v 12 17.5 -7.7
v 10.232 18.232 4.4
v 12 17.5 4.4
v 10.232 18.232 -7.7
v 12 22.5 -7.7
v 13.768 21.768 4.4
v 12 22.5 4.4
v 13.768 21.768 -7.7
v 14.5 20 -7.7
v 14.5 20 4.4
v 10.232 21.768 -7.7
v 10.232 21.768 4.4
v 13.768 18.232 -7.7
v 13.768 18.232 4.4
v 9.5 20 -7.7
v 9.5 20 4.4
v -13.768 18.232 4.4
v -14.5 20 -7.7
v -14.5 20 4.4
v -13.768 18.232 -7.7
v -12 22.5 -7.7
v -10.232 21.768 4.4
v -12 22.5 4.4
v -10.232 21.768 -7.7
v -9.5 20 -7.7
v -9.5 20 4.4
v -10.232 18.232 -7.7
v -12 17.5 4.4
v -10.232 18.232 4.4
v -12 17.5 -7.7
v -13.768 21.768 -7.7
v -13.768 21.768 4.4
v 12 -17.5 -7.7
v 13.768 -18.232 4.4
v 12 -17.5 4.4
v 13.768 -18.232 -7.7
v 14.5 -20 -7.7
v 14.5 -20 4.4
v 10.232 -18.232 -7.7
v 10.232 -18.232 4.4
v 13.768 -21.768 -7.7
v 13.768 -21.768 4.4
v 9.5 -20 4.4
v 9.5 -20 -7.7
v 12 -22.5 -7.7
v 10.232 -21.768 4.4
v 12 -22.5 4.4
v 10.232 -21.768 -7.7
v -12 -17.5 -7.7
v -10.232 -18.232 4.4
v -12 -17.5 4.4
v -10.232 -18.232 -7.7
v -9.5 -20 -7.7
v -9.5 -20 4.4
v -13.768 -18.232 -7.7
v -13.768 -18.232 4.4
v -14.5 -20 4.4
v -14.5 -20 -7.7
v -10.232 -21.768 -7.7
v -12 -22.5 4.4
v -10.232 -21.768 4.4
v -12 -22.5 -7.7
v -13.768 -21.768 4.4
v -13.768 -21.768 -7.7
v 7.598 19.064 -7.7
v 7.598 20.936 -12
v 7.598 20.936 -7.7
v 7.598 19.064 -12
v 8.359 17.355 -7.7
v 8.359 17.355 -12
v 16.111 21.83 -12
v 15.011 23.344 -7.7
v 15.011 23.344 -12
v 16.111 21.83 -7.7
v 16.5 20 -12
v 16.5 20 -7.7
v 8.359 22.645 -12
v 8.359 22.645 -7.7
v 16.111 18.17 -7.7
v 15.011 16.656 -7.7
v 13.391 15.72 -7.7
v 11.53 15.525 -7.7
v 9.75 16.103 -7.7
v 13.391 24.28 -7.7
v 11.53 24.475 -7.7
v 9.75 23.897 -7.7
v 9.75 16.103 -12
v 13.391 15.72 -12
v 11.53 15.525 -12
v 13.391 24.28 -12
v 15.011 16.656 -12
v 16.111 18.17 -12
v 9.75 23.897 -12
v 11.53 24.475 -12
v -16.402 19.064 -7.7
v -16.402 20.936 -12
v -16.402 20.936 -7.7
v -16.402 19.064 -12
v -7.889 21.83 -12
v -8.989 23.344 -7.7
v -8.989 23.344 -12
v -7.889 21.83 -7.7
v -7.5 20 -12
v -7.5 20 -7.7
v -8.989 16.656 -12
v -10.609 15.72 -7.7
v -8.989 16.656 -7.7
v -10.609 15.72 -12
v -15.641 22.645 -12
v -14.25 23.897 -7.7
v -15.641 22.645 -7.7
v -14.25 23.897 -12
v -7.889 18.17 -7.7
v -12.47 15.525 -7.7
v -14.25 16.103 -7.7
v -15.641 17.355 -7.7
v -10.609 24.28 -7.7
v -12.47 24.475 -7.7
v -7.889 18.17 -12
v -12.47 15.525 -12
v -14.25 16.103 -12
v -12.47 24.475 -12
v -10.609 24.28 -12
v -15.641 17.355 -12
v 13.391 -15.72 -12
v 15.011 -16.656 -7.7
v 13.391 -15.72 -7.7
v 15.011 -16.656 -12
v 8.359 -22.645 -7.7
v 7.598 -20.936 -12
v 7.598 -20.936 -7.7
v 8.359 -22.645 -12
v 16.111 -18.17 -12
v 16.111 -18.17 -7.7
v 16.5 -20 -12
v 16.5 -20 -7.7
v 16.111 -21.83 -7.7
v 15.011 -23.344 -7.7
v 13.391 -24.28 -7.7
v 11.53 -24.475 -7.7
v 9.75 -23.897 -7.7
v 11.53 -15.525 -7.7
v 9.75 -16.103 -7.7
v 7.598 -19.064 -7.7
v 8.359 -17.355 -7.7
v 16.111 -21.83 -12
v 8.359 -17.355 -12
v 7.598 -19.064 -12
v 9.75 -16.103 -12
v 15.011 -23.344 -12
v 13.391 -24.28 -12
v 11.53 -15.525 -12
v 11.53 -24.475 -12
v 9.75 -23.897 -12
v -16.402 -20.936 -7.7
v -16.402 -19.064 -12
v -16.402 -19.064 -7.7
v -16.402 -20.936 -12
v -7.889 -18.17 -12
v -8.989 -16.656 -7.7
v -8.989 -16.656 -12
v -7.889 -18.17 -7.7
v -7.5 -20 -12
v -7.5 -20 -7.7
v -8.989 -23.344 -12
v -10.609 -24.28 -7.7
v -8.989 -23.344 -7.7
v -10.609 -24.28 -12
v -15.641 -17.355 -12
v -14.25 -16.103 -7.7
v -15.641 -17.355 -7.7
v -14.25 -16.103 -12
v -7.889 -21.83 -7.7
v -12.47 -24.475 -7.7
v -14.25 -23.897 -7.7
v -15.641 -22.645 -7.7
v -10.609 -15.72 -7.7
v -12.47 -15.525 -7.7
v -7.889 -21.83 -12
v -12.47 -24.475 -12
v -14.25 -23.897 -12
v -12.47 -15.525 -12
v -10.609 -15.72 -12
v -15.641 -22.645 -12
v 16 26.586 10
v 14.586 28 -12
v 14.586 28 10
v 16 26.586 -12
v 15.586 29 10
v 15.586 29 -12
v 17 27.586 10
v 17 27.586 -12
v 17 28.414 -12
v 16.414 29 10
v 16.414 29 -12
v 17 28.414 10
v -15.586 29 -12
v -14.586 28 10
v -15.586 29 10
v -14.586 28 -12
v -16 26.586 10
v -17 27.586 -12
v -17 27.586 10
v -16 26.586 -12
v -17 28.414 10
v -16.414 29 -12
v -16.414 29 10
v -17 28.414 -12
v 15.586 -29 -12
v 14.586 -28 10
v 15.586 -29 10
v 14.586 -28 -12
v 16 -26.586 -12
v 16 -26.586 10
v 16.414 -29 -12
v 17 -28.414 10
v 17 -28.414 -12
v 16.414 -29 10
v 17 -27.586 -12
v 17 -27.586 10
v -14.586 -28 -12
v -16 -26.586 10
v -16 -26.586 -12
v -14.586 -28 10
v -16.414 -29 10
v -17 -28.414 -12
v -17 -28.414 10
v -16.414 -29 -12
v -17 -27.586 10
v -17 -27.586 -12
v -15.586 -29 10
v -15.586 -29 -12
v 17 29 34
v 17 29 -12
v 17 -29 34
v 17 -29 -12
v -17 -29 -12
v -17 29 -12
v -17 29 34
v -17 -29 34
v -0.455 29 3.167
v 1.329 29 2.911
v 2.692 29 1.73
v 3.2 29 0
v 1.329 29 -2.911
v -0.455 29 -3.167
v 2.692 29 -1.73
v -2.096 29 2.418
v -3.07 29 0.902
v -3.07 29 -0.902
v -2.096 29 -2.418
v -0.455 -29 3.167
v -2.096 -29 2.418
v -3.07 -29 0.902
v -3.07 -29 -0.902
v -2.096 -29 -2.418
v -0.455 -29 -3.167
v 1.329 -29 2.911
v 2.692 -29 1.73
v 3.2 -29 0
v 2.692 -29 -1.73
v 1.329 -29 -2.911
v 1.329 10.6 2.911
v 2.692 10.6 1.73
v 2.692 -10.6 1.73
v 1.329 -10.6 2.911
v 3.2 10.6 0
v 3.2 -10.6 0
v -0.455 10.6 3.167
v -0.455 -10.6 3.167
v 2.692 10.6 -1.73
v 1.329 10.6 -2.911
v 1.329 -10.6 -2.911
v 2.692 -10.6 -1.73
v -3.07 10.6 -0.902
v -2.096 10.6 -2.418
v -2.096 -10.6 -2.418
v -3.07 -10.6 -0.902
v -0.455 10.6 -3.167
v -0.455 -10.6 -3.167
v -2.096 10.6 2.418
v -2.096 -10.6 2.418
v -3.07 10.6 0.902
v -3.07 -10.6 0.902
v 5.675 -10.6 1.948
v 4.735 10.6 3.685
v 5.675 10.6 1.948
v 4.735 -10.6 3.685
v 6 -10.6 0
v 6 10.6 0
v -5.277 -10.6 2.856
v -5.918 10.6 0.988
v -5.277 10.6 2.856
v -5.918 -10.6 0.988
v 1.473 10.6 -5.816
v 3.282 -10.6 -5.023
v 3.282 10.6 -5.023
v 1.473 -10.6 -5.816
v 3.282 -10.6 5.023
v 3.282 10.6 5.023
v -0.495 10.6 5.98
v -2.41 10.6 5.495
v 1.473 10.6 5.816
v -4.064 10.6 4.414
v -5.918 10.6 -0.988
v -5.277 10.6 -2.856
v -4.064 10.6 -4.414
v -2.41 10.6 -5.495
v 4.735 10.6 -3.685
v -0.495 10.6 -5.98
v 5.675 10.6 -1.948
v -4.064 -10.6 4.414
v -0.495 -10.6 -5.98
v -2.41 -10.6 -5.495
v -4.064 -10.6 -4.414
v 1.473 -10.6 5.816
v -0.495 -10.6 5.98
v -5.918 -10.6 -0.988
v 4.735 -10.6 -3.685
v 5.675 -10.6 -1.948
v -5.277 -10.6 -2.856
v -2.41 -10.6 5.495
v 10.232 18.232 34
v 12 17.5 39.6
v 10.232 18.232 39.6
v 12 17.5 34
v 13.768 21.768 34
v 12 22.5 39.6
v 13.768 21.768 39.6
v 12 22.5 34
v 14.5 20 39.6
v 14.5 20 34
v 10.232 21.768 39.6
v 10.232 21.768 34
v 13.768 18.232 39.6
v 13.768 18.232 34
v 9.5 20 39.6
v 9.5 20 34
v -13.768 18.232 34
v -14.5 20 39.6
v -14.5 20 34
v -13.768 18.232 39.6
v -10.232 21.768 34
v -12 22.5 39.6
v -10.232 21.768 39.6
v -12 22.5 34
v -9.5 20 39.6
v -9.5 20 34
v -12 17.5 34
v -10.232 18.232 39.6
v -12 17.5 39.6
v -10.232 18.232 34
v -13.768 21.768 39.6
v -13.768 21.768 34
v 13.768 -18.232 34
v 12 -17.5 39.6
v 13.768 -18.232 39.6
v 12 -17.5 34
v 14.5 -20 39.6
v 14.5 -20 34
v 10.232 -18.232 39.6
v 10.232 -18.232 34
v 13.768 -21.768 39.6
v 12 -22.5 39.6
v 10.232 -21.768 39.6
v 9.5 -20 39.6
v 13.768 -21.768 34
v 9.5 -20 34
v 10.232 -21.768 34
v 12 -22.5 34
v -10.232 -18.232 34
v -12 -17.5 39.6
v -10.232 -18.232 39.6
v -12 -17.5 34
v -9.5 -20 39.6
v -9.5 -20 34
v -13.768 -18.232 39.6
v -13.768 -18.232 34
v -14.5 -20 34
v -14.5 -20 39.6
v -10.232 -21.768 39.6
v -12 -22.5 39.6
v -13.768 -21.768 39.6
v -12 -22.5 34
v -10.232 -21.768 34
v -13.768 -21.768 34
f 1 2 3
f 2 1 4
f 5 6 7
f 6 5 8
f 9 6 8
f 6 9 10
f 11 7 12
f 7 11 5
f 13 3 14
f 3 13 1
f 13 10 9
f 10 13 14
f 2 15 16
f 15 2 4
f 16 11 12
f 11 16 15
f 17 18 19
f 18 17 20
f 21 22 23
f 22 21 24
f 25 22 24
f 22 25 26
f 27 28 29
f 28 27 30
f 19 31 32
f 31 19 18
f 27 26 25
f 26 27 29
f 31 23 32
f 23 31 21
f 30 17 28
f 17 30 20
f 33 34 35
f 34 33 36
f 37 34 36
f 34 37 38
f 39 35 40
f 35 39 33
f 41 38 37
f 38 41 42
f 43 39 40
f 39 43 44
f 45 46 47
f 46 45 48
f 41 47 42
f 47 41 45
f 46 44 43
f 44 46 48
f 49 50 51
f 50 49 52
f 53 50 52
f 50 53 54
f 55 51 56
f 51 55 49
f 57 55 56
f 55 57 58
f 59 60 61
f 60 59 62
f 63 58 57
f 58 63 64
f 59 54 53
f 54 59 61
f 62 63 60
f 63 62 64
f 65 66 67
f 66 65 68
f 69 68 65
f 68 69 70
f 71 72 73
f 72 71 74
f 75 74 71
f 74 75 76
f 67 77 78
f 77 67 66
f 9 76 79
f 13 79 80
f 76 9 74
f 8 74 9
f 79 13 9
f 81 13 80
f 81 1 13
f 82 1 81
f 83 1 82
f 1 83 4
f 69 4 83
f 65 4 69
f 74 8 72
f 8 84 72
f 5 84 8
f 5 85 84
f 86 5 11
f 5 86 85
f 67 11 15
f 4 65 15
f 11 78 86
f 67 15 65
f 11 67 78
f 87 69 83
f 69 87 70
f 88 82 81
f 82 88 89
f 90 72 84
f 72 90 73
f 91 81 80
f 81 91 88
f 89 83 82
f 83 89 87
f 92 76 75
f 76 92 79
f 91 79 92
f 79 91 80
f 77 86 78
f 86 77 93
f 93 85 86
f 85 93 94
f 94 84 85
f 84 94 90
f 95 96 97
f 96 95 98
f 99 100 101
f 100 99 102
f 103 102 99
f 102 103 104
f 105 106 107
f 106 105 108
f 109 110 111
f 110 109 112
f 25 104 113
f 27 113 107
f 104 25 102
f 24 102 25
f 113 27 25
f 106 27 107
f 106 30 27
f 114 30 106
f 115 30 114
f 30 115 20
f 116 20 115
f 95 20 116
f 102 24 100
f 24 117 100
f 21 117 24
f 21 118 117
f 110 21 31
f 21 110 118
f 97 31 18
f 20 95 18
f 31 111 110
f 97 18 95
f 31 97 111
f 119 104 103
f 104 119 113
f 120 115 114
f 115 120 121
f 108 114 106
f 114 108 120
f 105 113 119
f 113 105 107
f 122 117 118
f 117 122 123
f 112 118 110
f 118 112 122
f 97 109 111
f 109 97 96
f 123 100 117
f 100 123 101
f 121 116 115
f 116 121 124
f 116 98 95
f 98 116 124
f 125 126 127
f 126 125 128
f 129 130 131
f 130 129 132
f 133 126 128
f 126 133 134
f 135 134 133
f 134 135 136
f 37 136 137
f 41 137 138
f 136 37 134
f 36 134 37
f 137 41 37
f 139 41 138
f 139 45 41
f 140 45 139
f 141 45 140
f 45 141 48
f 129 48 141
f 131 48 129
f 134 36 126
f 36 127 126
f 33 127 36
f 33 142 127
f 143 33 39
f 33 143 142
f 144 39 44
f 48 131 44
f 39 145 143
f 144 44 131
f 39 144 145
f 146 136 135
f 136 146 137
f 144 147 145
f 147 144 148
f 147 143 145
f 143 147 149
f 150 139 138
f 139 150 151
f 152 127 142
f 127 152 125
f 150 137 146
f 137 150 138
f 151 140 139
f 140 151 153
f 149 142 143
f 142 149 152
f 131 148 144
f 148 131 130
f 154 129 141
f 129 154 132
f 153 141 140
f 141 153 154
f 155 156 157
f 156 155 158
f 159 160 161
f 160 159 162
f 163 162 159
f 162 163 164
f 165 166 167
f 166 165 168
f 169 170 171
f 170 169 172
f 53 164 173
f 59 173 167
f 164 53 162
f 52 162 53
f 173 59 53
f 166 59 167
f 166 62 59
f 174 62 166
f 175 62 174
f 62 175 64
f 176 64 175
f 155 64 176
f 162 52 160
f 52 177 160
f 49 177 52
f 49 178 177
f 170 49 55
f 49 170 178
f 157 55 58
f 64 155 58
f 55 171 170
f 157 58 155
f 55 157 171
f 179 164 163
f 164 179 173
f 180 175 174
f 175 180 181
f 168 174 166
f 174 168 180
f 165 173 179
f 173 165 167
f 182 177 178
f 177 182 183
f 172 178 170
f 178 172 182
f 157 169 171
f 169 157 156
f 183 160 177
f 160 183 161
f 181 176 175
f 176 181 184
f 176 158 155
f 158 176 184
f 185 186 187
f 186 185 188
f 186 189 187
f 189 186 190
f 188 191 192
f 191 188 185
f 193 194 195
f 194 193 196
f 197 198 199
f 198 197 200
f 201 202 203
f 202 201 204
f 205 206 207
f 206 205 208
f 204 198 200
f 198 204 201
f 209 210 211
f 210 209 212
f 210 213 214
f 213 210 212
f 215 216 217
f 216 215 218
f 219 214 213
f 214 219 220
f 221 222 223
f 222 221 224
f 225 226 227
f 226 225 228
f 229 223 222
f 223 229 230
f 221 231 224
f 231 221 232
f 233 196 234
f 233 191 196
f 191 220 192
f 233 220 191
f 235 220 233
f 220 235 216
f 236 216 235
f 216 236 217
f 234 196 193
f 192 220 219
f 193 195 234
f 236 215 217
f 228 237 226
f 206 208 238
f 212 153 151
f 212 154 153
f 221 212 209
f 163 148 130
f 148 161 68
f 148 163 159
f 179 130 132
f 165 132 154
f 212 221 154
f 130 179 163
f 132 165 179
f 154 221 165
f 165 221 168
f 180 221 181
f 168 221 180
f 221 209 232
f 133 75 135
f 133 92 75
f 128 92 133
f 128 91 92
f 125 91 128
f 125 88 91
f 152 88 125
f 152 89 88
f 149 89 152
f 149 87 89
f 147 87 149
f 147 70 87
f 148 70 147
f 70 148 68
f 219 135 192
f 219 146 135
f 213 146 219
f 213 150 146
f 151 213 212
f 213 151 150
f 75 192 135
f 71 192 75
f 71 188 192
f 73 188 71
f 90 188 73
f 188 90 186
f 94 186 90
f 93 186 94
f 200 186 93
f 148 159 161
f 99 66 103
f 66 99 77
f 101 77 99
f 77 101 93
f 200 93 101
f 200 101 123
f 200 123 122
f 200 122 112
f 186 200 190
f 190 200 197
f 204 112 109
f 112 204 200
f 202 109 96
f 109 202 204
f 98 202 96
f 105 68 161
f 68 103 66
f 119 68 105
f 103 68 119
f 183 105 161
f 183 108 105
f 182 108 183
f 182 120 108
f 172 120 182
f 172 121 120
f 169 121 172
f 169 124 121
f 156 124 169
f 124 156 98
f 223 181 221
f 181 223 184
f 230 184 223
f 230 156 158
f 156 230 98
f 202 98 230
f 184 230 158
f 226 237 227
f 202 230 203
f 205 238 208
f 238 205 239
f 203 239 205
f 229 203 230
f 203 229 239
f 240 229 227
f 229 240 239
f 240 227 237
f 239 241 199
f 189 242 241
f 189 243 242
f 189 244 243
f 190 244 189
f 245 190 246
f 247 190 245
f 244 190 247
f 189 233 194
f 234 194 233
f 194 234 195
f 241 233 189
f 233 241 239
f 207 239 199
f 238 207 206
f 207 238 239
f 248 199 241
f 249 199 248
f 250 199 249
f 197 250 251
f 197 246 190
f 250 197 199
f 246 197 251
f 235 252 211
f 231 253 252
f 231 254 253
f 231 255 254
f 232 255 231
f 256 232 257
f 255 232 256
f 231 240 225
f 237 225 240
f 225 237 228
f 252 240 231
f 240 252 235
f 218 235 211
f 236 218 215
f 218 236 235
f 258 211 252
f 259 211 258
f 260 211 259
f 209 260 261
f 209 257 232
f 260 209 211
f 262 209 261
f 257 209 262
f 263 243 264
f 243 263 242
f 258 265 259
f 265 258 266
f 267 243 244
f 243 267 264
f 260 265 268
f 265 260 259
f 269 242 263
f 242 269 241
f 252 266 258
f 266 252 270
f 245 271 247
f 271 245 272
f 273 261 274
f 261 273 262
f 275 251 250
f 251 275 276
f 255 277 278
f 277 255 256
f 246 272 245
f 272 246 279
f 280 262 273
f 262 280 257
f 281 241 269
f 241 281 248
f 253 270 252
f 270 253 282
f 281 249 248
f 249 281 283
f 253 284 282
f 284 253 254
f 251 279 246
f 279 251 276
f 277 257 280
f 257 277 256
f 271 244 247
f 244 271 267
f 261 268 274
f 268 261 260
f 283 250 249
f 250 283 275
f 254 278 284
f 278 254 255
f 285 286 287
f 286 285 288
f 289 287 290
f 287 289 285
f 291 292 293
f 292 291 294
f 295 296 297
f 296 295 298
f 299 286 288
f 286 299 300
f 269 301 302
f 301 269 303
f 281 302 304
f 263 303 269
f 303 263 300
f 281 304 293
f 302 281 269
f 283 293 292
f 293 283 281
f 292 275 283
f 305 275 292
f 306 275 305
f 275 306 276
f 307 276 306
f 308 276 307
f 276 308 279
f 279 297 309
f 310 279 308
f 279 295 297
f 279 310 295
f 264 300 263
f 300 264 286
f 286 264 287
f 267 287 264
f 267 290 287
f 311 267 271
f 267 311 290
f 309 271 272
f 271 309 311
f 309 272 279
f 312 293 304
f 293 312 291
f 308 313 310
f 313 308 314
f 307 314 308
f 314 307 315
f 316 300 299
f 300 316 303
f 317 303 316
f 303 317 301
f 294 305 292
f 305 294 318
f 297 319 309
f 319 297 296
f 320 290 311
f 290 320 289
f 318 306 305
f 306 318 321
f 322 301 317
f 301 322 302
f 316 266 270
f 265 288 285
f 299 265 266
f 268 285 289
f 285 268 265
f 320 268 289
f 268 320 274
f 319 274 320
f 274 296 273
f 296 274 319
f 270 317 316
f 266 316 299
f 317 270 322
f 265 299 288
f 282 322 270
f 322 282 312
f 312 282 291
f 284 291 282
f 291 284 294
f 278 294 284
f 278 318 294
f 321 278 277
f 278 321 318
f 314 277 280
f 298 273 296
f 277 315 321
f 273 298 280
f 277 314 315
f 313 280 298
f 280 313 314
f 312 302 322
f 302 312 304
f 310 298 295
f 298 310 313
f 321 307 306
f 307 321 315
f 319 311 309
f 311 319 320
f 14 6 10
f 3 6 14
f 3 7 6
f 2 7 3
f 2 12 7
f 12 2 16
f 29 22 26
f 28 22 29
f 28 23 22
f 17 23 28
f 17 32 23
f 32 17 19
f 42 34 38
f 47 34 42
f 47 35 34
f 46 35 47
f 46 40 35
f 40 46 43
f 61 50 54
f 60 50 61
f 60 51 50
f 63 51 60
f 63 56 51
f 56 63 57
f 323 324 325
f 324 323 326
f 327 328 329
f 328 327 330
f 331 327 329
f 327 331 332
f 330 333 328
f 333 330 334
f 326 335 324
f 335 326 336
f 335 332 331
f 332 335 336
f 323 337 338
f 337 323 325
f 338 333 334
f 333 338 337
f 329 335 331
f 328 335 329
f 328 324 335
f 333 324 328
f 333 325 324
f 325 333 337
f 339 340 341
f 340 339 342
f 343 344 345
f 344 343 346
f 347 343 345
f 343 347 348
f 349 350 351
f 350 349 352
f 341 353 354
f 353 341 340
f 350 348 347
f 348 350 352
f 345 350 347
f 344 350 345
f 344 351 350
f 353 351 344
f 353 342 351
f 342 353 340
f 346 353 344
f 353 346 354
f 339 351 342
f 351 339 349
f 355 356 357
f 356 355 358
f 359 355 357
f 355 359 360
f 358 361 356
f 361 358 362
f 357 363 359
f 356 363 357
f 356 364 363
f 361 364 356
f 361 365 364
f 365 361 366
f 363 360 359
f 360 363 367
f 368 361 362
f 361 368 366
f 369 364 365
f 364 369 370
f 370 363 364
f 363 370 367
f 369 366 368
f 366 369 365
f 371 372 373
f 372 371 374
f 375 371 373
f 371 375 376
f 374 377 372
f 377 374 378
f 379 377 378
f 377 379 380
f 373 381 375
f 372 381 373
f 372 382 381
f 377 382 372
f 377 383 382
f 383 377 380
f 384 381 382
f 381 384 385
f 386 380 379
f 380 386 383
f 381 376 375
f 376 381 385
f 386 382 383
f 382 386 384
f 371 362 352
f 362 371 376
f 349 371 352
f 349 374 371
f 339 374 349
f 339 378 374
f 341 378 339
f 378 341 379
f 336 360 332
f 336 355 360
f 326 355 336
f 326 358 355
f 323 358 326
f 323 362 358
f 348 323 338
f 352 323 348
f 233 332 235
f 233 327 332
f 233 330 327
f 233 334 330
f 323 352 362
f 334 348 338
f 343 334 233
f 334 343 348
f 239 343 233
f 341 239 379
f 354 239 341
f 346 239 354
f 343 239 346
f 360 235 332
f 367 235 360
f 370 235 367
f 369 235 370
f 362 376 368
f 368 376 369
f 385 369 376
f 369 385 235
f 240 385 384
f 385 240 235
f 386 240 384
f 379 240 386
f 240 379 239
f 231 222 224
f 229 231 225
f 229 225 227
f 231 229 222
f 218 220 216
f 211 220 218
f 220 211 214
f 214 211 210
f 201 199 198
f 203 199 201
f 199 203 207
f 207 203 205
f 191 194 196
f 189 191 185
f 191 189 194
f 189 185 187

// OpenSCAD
// Parameters
shaft_diameter = 6.0; //[3.0:12.0:0.1]
block_width = 34.0; //[17.0:68.0:0.5]
block_length = 58.0; //[29.0:116.0:0.5]
block_height = 24.0; //[12.0:48.0:0.5]
bearing_outer_diameter = 12.0; //[8.0:24.0:0.1]
bearing_length = 20.0; //[10.0:40.0:0.5]
bore_diameter = 6.4; //[6.1:8.0:0.05]
mount_hole_diameter = 5.0; //[3.0:8.0:0.1]
mount_hole_pattern_x = 24.0; //[12.0:48.0:0.5]
mount_hole_pattern_y = 40.0; //[20.0:80.0:0.5]
counterbore_diameter = 9.0; //[7.0:16.0:0.1]
counterbore_depth = 4.0; //[2.0:10.0:0.1]
chamfer_size = 1.0; //[0.5:3.0:0.1]
bore_lead_in_chamfer = 1.0; //[0.5:3.0:0.1]
eps = 0.6; //[0.2:2.0:0.1]

// SCS Bearing Block Assembly
module scs_bearing_block_assembly() {
  color("Silver") {
    difference() {
      // Block Body
      cube([block_width, block_length, block_height], center=true);
      
      // Shaft Bore
      rotate([90, 0, 0])
        translate([0, 0, 0])
        cylinder(h=block_length + 2*eps, r=bore_diameter/2, center=true);
      
      // Bearing Seat
      rotate([90, 0, 0])
        translate([0, 0, 0])
        cylinder(h=bearing_length + 2*eps, r=bearing_outer_diameter/2, center=true);
      
      // Mounting Holes
      union() {
        translate([mount_hole_pattern_x/2, mount_hole_pattern_y/2, 0])
          cylinder(h=block_height + 2*eps, r=mount_hole_diameter/2, center=true);
        translate([-mount_hole_pattern_x/2, mount_hole_pattern_y/2, 0])
          cylinder(h=block_height + 2*eps, r=mount_hole_diameter/2, center=true);
        translate([mount_hole_pattern_x/2, -mount_hole_pattern_y/2, 0])
          cylinder(h=block_height + 2*eps, r=mount_hole_diameter/2, center=true);
        translate([-mount_hole_pattern_x/2, -mount_hole_pattern_y/2, 0])
          cylinder(h=block_height + 2*eps, r=mount_hole_diameter/2, center=true);
      }
      
      // Counterbores
      union() {
        translate([mount_hole_pattern_x/2, mount_hole_pattern_y/2, -block_height/2 + counterbore_depth/2])
          cylinder(h=counterbore_depth + eps, r=counterbore_diameter/2, center=true);
        translate([-mount_hole_pattern_x/2, mount_hole_pattern_y/2, -block_height/2 + counterbore_depth/2])
          cylinder(h=counterbore_depth + eps, r=counterbore_diameter/2, center=true);
        translate([mount_hole_pattern_x/2, -mount_hole_pattern_y/2, -block_height/2 + counterbore_depth/2])
          cylinder(h=counterbore_depth + eps, r=counterbore_diameter/2, center=true);
        translate([-mount_hole_pattern_x/2, -mount_hole_pattern_y/2, -block_height/2 + counterbore_depth/2])
          cylinder(h=counterbore_depth + eps, r=counterbore_diameter/2, center=true);
      }
      
      // Bore Lead-in Chamfers
      union() {
        rotate([90, 0, 0])
          translate([0, block_length/2 - bore_lead_in_chamfer/2 + eps/2, 0])
          cylinder(h=bore_lead_in_chamfer, r1=bearing_outer_diameter/2 + bore_lead_in_chamfer, r2=bore_diameter/2, center=true);
        rotate([-90, 0, 0])
          translate([0, -block_length/2 + bore_lead_in_chamfer/2 - eps/2, 0])
          cylinder(h=bore_lead_in_chamfer, r1=bearing_outer_diameter/2 + bore_lead_in_chamfer, r2=bore_diameter/2, center=true);
      }
      
      // Chamfers
      union() {
        translate([block_width/2 - chamfer_size, block_length/2 - chamfer_size, 0])
          rotate([0, 0, 45])
          cube([chamfer_size*2, chamfer_size*2, block_height + 2*eps], center=true);
        translate([-block_width/2 + chamfer_size, block_length/2 - chamfer_size, 0])
          rotate([0, 0, 45])
          cube([chamfer_size*2, chamfer_size*2, block_height + 2*eps], center=true);
        translate([block_width/2 - chamfer_size, -block_length/2 + chamfer_size, 0])
          rotate([0, 0, 45])
          cube([chamfer_size*2, chamfer_size*2, block_height + 2*eps], center=true);
        translate([-block_width/2 + chamfer_size, -block_length/2 + chamfer_size, 0])
          rotate([0, 0, 45])
          cube([chamfer_size*2, chamfer_size*2, block_height + 2*eps], center=true);
      }
    }
  }
}

// SBR Bearing Block Hole Positions
module sbr_bearing_block_hole_positions() {
  color("DimGray") {
    union() {
      translate([mount_hole_pattern_x/2, mount_hole_pattern_y/2, 0])
        cylinder(h=block_height + 2*eps, r=mount_hole_diameter/2, center=true);
      translate([-mount_hole_pattern_x/2, mount_hole_pattern_y/2, 0])
        cylinder(h=block_height + 2*eps, r=mount_hole_diameter/2, center=true);
      translate([mount_hole_pattern_x/2, -mount_hole_pattern_y/2, 0])
        cylinder(h=block_height + 2*eps, r=mount_hole_diameter/2, center=true);
      translate([-mount_hole_pattern_x/2, -mount_hole_pattern_y/2, 0])
        cylinder(h=block_height + 2*eps, r=mount_hole_diameter/2, center=true);
    }
  }
}

// SCS Bearing Block
module scs_bearing_block() {
  color("Silver") {
    cube([block_width, block_length, block_height], center=true);
  }
}

// SCS Bearing Block Hole Positions
module scs_bearing_block_hole_positions() {
  color("DimGray") {
    union() {
      translate([mount_hole_pattern_x/2, mount_hole_pattern_y/2, 0])
        cylinder(h=block_height + 2*eps, r=mount_hole_diameter/2, center=true);
      translate([-mount_hole_pattern_x/2, mount_hole_pattern_y/2, 0])
        cylinder(h=block_height + 2*eps, r=mount_hole_diameter/2, center=true);
      translate([mount_hole_pattern_x/2, -mount_hole_pattern_y/2, 0])
        cylinder(h=block_height + 2*eps, r=mount_hole_diameter/2, center=true);
      translate([-mount_hole_pattern_x/2, -mount_hole_pattern_y/2, 0])
        cylinder(h=block_height + 2*eps, r=mount_hole_diameter/2, center=true);
    }
  }
}

// Assembly
module assembly() {
  scs_bearing_block_assembly();
  translate([0, 0, block_height/2 + 5]) sbr_bearing_block_hole_positions();
  translate([0, 0, block_height/2 + 10]) scs_bearing_block();
  translate([0, 0, block_height/2 + 15]) scs_bearing_block_hole_positions();
}

assembly();
